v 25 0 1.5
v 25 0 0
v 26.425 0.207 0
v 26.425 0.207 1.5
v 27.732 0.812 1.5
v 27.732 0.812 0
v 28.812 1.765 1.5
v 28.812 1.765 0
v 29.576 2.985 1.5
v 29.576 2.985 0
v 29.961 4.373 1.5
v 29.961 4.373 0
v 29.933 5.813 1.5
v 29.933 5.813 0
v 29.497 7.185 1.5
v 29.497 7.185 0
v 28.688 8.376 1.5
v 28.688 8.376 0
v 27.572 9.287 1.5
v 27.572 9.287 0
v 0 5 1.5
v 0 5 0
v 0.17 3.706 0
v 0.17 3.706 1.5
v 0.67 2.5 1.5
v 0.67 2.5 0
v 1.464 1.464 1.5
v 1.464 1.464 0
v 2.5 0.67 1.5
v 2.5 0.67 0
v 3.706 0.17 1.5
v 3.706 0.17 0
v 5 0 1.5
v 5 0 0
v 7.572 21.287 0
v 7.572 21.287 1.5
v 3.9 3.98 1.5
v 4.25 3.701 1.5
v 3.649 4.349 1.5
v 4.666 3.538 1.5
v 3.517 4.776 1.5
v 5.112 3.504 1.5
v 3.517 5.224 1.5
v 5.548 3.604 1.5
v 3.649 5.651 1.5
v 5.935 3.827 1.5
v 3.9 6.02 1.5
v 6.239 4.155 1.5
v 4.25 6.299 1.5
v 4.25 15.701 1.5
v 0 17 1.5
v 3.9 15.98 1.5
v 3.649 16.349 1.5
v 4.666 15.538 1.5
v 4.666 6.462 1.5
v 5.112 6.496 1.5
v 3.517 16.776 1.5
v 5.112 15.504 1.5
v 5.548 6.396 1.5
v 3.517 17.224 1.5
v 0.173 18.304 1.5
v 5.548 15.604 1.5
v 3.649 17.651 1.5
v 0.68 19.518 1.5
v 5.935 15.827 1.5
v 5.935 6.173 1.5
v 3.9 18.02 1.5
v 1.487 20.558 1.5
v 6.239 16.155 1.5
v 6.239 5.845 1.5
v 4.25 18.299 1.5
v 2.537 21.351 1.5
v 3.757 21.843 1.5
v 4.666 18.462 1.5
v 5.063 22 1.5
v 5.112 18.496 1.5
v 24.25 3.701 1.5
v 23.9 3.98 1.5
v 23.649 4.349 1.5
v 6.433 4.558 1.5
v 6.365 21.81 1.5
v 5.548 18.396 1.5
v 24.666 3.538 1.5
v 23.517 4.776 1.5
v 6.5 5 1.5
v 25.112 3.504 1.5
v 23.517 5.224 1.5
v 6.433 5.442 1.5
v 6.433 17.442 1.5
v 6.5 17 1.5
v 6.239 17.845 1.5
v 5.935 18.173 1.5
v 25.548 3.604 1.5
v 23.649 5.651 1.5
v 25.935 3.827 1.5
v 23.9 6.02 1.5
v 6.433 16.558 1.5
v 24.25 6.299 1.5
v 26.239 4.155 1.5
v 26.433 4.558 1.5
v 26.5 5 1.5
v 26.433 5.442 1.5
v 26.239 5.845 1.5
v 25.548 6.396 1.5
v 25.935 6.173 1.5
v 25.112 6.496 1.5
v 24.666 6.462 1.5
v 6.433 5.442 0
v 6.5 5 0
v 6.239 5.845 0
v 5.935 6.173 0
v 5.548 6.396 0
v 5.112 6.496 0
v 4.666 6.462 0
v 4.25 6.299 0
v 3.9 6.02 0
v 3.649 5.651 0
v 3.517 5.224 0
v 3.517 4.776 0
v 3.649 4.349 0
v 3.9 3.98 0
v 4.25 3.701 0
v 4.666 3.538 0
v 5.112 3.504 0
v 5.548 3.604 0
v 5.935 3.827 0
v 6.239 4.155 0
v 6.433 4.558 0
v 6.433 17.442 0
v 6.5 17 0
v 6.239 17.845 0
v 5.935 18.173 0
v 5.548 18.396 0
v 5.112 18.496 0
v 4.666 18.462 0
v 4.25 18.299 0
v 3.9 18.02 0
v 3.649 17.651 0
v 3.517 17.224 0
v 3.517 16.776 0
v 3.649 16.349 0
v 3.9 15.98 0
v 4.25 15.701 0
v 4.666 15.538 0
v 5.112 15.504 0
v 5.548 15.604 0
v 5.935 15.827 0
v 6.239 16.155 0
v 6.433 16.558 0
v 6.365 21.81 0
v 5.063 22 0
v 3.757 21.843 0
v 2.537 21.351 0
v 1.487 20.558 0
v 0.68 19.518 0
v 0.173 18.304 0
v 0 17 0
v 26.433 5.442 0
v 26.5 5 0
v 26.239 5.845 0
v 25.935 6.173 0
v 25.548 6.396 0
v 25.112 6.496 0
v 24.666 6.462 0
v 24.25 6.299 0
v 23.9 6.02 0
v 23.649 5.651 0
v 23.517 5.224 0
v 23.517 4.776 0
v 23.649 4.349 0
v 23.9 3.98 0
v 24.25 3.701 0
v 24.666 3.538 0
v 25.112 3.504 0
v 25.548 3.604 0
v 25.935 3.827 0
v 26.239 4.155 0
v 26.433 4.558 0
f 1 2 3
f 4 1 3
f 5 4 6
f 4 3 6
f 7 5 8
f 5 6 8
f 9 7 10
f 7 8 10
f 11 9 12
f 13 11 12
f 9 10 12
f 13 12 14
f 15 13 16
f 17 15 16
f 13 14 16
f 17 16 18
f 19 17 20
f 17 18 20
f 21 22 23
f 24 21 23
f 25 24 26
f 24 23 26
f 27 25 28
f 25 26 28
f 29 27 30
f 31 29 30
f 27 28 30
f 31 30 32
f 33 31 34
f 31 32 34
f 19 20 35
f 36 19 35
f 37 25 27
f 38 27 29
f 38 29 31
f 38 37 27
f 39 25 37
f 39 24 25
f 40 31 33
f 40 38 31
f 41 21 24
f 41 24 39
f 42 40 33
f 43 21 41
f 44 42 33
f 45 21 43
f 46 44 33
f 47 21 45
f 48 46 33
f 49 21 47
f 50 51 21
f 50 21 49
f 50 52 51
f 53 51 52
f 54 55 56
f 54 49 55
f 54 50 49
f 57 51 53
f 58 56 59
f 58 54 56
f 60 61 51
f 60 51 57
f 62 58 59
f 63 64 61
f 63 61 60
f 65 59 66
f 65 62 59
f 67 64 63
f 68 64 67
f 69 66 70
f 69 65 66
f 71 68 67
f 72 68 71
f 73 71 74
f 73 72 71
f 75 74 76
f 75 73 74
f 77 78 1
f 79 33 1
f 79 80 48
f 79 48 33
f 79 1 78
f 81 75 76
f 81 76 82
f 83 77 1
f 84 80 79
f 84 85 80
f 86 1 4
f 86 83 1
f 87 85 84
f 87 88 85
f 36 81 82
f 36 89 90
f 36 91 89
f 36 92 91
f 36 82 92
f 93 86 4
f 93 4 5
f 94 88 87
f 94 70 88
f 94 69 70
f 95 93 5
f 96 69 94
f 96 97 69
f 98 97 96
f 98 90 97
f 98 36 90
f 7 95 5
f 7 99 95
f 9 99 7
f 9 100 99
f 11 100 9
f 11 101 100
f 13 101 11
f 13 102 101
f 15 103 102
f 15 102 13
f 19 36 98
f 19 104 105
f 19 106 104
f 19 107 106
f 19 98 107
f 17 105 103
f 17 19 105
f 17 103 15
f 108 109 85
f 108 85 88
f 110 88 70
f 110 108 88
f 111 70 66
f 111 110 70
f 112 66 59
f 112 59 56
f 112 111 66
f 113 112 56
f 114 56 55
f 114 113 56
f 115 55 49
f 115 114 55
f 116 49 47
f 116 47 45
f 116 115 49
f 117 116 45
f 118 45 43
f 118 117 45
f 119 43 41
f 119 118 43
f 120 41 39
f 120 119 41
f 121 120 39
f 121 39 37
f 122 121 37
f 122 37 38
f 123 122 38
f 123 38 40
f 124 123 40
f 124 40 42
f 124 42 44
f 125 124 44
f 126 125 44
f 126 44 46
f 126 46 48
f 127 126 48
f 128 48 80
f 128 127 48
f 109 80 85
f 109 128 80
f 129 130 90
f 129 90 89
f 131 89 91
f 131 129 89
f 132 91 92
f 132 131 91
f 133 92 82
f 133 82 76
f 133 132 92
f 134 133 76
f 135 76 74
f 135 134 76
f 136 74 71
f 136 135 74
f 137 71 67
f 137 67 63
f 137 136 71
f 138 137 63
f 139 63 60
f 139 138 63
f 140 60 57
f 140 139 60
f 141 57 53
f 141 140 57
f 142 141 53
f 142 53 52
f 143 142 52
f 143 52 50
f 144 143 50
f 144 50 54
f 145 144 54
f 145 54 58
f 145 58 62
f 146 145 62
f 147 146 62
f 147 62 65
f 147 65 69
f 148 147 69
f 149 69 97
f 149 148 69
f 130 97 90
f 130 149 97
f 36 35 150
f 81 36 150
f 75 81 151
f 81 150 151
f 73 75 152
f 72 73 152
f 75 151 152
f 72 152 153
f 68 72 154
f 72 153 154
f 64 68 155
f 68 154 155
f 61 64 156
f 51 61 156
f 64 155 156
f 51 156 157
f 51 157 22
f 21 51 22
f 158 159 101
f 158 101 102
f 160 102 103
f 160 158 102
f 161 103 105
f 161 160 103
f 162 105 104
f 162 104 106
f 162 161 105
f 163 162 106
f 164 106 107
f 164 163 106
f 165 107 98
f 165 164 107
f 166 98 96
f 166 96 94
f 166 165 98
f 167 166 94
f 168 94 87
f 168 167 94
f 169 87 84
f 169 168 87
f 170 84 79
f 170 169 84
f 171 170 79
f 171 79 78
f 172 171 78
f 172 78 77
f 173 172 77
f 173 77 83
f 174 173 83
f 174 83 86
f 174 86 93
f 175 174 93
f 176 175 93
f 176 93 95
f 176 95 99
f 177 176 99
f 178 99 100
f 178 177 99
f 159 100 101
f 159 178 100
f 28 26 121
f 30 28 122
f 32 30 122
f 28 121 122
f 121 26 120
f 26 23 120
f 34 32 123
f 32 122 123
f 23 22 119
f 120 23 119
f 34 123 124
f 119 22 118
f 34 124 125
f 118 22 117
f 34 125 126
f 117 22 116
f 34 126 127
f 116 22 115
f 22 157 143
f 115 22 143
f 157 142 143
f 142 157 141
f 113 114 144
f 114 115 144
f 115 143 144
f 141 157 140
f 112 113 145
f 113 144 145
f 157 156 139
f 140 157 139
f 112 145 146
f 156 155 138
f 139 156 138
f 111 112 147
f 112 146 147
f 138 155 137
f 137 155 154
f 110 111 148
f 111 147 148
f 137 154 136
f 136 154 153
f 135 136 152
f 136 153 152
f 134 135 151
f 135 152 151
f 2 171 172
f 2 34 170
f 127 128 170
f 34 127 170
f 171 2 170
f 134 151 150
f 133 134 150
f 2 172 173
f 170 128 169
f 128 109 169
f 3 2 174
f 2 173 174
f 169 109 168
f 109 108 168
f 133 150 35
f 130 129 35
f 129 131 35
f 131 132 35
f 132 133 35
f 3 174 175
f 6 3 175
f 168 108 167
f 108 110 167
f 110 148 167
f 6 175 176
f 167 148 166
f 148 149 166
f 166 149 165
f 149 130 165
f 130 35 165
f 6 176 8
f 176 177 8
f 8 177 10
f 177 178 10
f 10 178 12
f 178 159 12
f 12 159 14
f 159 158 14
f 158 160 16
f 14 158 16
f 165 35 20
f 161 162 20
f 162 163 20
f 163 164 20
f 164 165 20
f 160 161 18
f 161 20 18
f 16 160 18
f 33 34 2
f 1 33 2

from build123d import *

# Parameters (mm, degrees)
F0_R     = 1.5
F1_DEPTH = 1.5


with BuildPart() as f1:
    # F0 (on Top) → F1 (new body)
    with BuildSketch(Plane.XY):
        with BuildLine():
            Line((0, 17), (0, 5))
            ThreePointArc((0, 5), (1.464466, 1.464466), (5, 0))
            Line((5, 0), (25, 0))
            ThreePointArc((25, 0), (29.818575, 3.665332), (27.572479, 9.287465))
            Line((27.572479, 9.287465), (7.572479, 21.287465))
            ThreePointArc((7.572479, 21.287465), (2.536506, 21.351), (0, 17))
        make_face()
        with Locations((5, 5)):
            Circle(F0_R, mode=Mode.SUBTRACT)
        with Locations((25, 5)):
            Circle(F0_R, mode=Mode.SUBTRACT)
        with Locations((5, 17)):
            Circle(F0_R, mode=Mode.SUBTRACT)
    extrude(amount=F1_DEPTH)


solid = f1.part
